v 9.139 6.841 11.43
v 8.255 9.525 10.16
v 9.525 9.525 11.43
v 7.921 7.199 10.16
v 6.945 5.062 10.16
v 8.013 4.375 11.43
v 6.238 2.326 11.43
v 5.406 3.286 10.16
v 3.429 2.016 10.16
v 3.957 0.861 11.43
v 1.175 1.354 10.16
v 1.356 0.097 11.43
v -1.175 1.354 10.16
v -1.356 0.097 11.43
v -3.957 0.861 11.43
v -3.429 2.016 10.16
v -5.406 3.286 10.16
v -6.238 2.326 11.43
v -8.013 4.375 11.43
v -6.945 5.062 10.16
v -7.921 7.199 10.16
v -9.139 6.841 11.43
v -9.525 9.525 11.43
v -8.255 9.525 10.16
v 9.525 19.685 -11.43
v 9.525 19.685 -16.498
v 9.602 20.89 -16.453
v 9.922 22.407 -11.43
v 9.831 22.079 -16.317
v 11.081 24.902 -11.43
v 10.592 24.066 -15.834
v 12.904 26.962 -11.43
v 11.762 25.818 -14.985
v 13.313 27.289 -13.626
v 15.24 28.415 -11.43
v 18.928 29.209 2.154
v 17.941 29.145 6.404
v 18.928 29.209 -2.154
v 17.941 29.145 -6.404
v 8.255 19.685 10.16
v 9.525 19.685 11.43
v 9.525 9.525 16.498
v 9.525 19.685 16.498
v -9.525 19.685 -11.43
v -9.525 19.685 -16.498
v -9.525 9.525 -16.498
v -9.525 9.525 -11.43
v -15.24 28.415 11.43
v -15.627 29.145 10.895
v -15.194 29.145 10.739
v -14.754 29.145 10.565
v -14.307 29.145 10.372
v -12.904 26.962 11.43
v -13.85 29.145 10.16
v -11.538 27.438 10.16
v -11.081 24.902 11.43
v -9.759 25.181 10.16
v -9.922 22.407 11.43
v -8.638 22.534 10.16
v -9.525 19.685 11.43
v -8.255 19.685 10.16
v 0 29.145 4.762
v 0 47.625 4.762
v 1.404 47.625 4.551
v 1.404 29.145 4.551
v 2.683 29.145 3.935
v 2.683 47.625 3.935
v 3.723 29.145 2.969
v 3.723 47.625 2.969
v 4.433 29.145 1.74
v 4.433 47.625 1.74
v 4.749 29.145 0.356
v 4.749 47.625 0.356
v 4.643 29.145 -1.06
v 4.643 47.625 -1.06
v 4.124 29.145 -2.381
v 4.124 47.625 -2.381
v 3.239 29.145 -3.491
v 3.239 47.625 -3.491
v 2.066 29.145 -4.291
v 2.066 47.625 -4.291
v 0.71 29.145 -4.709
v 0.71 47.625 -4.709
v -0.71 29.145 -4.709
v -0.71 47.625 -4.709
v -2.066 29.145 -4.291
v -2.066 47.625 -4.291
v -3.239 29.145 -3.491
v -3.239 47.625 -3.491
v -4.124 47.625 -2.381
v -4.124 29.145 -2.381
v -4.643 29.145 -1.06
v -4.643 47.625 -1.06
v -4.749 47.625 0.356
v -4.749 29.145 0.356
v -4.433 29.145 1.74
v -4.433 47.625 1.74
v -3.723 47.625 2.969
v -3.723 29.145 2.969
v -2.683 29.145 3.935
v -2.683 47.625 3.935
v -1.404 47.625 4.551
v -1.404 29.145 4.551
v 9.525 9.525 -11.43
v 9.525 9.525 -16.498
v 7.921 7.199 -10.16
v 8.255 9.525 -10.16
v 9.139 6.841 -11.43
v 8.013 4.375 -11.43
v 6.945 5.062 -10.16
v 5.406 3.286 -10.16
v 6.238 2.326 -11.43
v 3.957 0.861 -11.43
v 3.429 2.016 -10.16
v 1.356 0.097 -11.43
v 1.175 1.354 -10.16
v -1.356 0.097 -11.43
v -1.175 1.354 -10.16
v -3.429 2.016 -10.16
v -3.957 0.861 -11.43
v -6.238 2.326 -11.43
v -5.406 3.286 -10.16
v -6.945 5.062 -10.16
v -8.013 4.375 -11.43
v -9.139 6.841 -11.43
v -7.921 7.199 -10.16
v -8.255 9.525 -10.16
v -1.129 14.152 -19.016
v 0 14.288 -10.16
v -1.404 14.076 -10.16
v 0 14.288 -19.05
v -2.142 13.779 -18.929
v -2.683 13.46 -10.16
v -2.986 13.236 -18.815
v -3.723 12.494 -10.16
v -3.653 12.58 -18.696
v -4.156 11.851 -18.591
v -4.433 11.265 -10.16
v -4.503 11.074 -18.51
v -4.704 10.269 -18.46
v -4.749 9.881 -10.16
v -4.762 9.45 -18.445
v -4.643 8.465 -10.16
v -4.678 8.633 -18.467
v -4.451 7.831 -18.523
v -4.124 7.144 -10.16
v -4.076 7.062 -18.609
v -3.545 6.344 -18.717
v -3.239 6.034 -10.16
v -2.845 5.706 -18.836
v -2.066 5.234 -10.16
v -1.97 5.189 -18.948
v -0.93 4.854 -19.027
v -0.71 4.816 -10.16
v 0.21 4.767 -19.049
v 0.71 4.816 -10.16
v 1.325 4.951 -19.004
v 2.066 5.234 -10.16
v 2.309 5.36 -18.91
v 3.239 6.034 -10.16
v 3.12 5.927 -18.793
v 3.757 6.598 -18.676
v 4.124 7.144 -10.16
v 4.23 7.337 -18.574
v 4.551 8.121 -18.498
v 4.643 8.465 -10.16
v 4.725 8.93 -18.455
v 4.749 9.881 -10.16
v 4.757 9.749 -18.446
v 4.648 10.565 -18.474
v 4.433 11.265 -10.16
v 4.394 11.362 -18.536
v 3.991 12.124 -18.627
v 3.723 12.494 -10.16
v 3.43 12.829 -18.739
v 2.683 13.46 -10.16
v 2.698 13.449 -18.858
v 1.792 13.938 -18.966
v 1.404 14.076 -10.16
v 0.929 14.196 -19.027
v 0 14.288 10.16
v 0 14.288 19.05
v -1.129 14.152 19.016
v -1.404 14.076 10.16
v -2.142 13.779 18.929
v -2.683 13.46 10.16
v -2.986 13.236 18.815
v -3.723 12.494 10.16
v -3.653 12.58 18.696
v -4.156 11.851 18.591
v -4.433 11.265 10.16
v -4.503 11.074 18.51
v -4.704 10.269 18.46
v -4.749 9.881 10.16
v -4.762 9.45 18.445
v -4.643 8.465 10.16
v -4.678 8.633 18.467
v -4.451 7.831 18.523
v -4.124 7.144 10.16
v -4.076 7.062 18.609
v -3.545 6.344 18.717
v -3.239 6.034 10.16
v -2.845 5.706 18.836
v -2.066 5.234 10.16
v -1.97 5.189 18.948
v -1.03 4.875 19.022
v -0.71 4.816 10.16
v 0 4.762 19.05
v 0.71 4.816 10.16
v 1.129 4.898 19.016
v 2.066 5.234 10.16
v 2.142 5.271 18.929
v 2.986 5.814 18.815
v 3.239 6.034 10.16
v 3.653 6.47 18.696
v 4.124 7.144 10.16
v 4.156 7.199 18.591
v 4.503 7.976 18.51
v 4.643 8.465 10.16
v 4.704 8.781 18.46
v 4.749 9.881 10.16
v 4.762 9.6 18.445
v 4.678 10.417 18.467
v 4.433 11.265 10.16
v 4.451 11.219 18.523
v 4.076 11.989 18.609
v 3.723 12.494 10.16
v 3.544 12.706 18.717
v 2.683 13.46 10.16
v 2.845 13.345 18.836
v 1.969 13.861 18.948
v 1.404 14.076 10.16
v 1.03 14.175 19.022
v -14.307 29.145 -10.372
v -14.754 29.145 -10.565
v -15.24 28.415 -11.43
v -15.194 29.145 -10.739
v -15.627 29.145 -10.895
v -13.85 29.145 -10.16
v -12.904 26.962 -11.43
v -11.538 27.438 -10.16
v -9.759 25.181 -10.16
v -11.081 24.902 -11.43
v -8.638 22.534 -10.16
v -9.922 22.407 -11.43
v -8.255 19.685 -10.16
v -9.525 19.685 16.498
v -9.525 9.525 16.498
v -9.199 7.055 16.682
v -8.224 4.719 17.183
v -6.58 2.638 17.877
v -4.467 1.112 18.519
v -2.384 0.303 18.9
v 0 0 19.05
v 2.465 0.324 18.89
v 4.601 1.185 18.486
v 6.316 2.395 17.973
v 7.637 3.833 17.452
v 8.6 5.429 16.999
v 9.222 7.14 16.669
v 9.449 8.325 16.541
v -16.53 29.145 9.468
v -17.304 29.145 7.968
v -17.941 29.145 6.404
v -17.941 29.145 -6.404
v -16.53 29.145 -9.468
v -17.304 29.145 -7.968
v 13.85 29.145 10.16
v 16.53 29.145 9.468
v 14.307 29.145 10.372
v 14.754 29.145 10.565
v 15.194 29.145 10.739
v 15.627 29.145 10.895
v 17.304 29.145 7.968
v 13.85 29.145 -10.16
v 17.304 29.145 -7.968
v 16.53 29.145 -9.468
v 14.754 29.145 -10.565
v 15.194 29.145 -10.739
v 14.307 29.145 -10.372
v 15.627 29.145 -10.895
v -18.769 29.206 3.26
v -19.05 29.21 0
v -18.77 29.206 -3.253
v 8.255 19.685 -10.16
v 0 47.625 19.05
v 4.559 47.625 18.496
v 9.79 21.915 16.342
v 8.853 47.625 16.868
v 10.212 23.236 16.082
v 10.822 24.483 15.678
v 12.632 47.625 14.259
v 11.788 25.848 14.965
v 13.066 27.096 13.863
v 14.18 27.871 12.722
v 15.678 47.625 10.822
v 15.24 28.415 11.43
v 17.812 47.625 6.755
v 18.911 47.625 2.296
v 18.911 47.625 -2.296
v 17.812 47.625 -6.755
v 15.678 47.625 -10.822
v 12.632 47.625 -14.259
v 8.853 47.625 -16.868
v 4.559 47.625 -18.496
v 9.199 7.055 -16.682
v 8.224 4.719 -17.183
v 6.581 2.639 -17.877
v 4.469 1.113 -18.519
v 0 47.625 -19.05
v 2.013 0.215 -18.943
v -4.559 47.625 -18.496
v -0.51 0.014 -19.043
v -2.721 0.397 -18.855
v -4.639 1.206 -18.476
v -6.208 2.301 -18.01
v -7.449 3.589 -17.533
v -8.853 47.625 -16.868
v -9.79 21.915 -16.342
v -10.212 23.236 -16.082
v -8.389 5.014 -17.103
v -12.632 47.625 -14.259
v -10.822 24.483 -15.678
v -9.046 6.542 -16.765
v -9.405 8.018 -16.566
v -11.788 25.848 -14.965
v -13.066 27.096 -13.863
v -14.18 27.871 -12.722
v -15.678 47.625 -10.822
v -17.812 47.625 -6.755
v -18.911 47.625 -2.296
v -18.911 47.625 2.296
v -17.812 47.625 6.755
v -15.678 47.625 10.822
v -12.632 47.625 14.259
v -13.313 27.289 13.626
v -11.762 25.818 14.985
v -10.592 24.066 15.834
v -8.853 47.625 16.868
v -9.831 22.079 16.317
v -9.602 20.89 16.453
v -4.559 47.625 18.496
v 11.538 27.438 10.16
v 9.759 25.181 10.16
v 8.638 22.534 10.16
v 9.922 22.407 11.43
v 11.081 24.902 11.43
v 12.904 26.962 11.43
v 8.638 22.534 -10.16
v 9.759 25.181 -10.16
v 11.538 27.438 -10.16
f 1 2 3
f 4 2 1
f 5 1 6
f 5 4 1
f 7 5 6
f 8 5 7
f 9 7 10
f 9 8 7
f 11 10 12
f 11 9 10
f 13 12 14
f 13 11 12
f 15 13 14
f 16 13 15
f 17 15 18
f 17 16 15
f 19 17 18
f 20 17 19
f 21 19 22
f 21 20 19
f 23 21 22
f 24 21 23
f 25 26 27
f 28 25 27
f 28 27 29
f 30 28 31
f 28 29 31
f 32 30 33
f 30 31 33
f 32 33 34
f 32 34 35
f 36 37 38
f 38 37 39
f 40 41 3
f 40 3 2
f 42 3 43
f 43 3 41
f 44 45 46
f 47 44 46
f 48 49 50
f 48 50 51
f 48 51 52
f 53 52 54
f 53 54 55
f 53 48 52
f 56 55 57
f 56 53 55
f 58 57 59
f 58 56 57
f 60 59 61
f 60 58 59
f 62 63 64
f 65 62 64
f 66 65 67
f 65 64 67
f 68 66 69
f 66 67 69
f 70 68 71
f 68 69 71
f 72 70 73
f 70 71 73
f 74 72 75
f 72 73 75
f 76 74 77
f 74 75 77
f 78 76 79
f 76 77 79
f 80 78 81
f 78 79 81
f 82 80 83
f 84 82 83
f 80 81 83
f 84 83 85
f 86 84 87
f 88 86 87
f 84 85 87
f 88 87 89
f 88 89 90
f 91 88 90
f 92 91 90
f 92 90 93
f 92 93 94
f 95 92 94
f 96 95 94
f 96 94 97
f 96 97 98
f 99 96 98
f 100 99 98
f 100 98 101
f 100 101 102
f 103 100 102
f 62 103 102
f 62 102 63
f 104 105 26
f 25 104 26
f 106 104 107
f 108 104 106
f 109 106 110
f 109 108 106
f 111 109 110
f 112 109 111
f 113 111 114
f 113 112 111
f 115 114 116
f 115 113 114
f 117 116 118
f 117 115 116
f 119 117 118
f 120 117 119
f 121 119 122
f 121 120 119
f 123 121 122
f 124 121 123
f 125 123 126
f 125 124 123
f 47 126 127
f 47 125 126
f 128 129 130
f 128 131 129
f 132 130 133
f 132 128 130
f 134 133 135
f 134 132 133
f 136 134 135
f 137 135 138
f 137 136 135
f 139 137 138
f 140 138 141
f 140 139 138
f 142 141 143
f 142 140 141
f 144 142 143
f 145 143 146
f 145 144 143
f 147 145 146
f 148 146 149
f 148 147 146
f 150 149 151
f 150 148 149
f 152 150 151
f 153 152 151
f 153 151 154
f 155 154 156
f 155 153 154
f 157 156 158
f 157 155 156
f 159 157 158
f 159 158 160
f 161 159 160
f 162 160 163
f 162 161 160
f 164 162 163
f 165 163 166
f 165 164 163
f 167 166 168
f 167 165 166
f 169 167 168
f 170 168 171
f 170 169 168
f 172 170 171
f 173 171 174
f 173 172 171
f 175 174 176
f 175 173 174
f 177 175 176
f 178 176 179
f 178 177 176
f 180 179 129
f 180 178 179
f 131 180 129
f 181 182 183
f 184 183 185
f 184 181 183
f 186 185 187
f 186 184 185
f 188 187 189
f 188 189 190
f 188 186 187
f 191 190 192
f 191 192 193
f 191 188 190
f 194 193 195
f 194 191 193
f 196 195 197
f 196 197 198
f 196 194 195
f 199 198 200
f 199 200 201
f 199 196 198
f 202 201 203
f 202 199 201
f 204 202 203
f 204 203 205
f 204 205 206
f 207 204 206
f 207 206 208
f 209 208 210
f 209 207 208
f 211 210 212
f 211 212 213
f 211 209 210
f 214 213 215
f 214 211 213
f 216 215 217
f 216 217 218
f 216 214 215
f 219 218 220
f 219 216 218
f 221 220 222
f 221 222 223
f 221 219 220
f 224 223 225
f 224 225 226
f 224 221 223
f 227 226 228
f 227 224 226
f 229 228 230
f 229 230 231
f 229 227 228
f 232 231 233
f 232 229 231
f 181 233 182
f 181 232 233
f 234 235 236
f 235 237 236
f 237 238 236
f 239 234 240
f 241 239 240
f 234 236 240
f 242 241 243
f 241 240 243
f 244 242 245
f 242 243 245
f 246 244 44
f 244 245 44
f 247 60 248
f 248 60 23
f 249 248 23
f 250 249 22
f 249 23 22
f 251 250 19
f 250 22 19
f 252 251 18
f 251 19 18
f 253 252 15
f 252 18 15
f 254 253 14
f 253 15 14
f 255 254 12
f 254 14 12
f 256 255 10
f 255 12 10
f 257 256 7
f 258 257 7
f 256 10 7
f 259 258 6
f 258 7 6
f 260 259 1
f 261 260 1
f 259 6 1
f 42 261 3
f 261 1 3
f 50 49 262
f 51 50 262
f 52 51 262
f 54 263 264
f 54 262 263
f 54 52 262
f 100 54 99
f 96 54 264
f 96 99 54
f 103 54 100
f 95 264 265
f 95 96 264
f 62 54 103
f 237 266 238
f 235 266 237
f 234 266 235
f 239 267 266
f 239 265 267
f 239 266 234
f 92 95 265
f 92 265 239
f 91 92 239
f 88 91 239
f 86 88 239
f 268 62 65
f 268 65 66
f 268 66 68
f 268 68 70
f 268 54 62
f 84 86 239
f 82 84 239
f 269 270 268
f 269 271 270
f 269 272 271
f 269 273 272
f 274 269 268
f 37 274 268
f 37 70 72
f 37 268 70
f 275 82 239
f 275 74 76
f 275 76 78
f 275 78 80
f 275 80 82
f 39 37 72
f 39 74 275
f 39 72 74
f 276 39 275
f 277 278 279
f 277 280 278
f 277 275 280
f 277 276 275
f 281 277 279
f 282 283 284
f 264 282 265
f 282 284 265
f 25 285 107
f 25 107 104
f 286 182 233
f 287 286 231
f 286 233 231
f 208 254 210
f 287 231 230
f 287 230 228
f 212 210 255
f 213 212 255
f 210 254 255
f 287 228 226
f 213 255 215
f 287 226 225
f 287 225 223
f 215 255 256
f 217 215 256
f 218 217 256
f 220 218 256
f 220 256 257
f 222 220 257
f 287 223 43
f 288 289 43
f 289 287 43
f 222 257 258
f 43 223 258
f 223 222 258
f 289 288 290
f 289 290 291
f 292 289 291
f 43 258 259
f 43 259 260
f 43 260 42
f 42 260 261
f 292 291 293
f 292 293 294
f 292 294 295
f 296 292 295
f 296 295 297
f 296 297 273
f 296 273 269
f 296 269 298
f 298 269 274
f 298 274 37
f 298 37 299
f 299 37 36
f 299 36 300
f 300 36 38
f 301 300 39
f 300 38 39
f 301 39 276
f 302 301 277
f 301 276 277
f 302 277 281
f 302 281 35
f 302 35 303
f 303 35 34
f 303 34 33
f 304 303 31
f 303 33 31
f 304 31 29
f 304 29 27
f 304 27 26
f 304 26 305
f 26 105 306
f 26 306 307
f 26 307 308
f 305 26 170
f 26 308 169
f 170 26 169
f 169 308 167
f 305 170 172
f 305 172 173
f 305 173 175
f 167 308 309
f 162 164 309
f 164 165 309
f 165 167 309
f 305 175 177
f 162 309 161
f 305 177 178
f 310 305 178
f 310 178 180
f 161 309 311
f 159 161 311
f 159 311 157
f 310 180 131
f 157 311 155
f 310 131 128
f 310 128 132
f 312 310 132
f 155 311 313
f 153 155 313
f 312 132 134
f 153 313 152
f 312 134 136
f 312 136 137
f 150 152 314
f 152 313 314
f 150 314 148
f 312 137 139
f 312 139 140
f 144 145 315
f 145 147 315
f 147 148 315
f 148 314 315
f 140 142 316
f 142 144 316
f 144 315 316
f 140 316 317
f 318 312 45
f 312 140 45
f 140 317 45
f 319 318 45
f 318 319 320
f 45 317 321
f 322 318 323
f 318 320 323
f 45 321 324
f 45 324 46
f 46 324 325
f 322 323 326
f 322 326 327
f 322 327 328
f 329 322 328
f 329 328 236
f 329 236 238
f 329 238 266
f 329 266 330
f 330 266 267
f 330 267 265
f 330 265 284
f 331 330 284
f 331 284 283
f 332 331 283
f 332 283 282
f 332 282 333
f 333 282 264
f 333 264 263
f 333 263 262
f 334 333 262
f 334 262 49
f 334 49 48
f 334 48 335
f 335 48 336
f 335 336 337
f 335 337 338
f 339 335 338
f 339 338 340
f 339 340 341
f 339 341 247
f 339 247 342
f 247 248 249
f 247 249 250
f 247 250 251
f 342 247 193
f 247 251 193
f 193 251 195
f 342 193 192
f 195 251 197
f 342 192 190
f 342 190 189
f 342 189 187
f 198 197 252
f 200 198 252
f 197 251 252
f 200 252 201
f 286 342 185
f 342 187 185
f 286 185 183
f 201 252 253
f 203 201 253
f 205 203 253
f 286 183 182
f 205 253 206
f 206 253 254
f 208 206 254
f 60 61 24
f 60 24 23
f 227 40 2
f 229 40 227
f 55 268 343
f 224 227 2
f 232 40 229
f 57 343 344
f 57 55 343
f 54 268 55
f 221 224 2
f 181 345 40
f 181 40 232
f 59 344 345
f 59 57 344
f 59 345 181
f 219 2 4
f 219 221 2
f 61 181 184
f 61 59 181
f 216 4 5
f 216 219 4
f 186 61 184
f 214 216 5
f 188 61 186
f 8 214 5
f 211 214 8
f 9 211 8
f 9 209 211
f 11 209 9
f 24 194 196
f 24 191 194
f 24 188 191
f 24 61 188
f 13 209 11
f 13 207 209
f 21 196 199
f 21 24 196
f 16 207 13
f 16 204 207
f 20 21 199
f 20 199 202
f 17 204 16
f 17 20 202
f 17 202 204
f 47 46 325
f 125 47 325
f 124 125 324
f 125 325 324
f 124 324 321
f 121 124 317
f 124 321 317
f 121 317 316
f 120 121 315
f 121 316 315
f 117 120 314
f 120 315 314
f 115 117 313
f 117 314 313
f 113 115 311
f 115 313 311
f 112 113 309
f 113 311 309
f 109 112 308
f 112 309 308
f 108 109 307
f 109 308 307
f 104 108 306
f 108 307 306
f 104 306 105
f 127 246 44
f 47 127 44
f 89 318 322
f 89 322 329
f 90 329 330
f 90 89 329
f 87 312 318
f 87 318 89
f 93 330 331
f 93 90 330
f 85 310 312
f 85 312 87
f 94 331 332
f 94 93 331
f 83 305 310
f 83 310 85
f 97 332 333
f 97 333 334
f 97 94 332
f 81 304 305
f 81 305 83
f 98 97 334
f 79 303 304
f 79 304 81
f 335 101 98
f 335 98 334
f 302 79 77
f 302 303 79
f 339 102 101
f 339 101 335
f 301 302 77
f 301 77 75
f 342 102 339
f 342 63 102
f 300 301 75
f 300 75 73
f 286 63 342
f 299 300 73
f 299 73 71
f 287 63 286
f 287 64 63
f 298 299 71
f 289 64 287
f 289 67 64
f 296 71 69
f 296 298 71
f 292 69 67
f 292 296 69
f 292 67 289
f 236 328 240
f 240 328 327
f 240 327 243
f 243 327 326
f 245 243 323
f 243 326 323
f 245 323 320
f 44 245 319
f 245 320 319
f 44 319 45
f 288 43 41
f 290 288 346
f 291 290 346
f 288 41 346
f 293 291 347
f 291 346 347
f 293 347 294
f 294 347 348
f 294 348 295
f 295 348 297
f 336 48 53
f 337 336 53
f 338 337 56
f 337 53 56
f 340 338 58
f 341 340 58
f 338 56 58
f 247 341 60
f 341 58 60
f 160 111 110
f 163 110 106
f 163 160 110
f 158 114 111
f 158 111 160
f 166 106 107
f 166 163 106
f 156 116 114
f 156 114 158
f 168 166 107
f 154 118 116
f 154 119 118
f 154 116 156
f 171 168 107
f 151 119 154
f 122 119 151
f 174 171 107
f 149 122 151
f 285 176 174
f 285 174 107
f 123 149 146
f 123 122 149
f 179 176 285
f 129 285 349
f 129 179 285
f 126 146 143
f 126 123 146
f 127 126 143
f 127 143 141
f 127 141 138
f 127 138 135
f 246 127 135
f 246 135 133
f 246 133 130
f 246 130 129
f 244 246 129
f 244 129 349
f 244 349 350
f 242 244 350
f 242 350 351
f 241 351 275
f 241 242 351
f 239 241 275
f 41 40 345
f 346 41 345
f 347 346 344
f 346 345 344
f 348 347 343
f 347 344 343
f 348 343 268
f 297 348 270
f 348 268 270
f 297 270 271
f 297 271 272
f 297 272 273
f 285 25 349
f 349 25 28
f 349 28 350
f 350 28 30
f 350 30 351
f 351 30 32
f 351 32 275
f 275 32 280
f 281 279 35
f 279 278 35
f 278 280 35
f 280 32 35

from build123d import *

# Parameters (mm, degrees)
SKETCH1_R               = 19.05
BASE_EXTRUDE_DEPTH      = 47.625
CUT_EXTRUDE1_DEPTH      = 55.716959208
CUT_EXTRUDE1_DEPTH_BACK = 55.716959208
CUT_EXTRUDE5_DEPTH      = 55.716959365
CUT_EXTRUDE5_DEPTH_BACK = 55.716959365
CUT_EXTRUDE6_DEPTH      = 55.716959365
CUT_EXTRUDE6_DEPTH_BACK = 55.716959365
SKETCH11_R              = 4.7625
SKETCH12_R              = 4.7625
CUT_EXTRUDE7_DEPTH      = 55.716959365
CHAMFER1_SIZE           = 1.27


with BuildPart() as part:
    # Sketch1 → Base-Extrude (new body)
    with BuildSketch(Plane(origin=(0, 0, 0), x_dir=(-1, 0, 0), z_dir=(0, 1, 0))):
        with Locations(Location((0, 0, 0), (0, 0, 90))):
            Circle(SKETCH1_R)
    extrude(amount=BASE_EXTRUDE_DEPTH)

    # Sketch2 → Cut-Extrude1 (cut, two sides: drawn at the far end of the back side and taken through both)
    with BuildSketch(Plane.XY.offset(-CUT_EXTRUDE1_DEPTH_BACK)):
        with BuildLine():
            Line((-19.05, -131.979516723), (-19.05, 0))
            Line((-19.05, 0), (-19.05, 29.21))
            ThreePointArc((-19.05, 29.21), (-12.314807909, 26.420192091), (-9.525, 19.685))
            Line((-9.525, 19.685), (-9.525, 9.525))
            ThreePointArc((-9.525, 9.525), (0, 0), (9.525, 9.525))
            Line((9.525, 9.525), (9.525, 19.685))
            ThreePointArc((9.525, 19.685), (12.314807909, 26.420192091), (19.05, 29.21))
            Line((19.05, 29.21), (19.05, 0))
            Line((19.05, 0), (19.05, -131.979516723))
            Line((19.05, -131.979516723), (19.05, -395.938550169))
            Line((19.05, -395.938550169), (-19.05, -395.938550169))
            Line((-19.05, -395.938550169), (-19.05, -131.979516723))
        make_face()
    extrude(amount=CUT_EXTRUDE1_DEPTH + CUT_EXTRUDE1_DEPTH_BACK, mode=Mode.SUBTRACT)

    # Sketch8 → Cut-Extrude5 (cut, two sides: drawn at the far end of the back side and taken through both)
    with BuildSketch(Plane(origin=(0, 0, 0), x_dir=(0, 0, -1), z_dir=(1, 0, 0)).offset(-CUT_EXTRUDE5_DEPTH_BACK)):
        Polygon((-10.16, -121.738350451), (-10.16, 0), (-10.16, 29.145238826), (10.16, 29.145238826), (10.16, 0), (10.16, -121.738350451), (10.16, -365.215051352), (-10.16, -365.215051352), align=None)
    extrude(amount=CUT_EXTRUDE5_DEPTH + CUT_EXTRUDE5_DEPTH_BACK, mode=Mode.SUBTRACT)

    # Sketch11 → Cut-Extrude6 (cut, two sides: drawn at the far end of the back side and taken through both)
    with BuildSketch(Plane.XY.offset(-CUT_EXTRUDE6_DEPTH_BACK)):
        with Locations(Location((0, 9.525, 0), (0, 0, 90))):
            Circle(SKETCH11_R)
    extrude(amount=CUT_EXTRUDE6_DEPTH + CUT_EXTRUDE6_DEPTH_BACK, mode=Mode.SUBTRACT)

    # Sketch12 → Cut-Extrude7 (cut, through all)
    with BuildSketch(Plane(origin=(0, 47.625, 0), x_dir=(-1, 0, 0), z_dir=(0, 1, 0))):
        with Locations(Location((0, 0, 0), (0, 0, 90))):
            Circle(SKETCH12_R)
    extrude(amount=-CUT_EXTRUDE7_DEPTH, mode=Mode.SUBTRACT)

    # Chamfer1
    # the kernel refuses this chamfer: 1.27 mm, written as the material it takes off along each edge
    with BuildSketch(Plane(origin=(19.05, 19.685, -10.16), x_dir=(-1, 0, 0), z_dir=(0, -1, 0))) as chamfer1_piece_1_section:
        Polygon((9.525 + CHAMFER1_SIZE, 0), (9.525, CHAMFER1_SIZE), (9.525, 0), align=None)
    chamfer1_piece_1 = revolve(axis=Axis((19.05, 19.685, -10.16), (0, 0, -1)), revolution_arc=91.701103325, mode=Mode.PRIVATE)
    chamfer1_piece_1 = split(chamfer1_piece_1, bisect_by=Plane(origin=(9.159628587, 29.145238826, -10.520330591), z_dir=(0, -1, 0)), keep=Keep.TOP, mode=Mode.PRIVATE)
    add(chamfer1_piece_1, mode=Mode.SUBTRACT)
    with BuildSketch(Plane(origin=(9.525, 19.685, -10.16), x_dir=(-0.9996219169112966, 0, 0.027495876610585942), z_dir=(0, -1, 0)), Plane(origin=(-9.525, 9.525, -10.16), x_dir=(0.9996219169112966, 0, 0.027495876610585942), z_dir=(0, 1, 0)), Plane(origin=(-9.525, 19.685, 10.16), x_dir=(0.9996219169112966, 0, -0.027495876610585942), z_dir=(0, -1, 0))) as chamfer1_piece_2:
        Polygon((CHAMFER1_SIZE * 0.999621916911, CHAMFER1_SIZE * 0.0274958766106), (-CHAMFER1_SIZE * 0.0274958766106, CHAMFER1_SIZE * 0.999621916911), (0, 0), align=None)
    extrude(amount=10.16, mode=Mode.SUBTRACT)
    with BuildSketch(Plane(origin=(0, 9.525, -10.16), x_dir=(1, 0, 0), z_dir=(0, 1, 0))) as chamfer1_piece_3:
        Polygon((9.525 - CHAMFER1_SIZE, 0), (9.525, CHAMFER1_SIZE), (9.525, 0), align=None)
    revolve(axis=Axis((0, 9.525, -10.16), (0, 0, -1)), revolution_arc=180, mode=Mode.SUBTRACT)
    with BuildSketch(Plane(origin=(-19.05, 19.685, -10.16), x_dir=(-0.029685492056236547, 0.9995592886674503, 0), z_dir=(-0.9995592886674503, -0.029685492056236547, 0))) as chamfer1_piece_4_section:
        Polygon((9.525 + CHAMFER1_SIZE, 0), (9.525, CHAMFER1_SIZE), (9.525, 0), align=None)
    chamfer1_piece_4 = revolve(axis=Axis((-19.05, 19.685, -10.16), (0, 0, -1)), revolution_arc=91.701103313, mode=Mode.PRIVATE)
    chamfer1_piece_4 = split(chamfer1_piece_4, bisect_by=Plane(origin=(-11.981482464, 29.145238826, -10.596388044), z_dir=(0, -1, 0)), keep=Keep.TOP, mode=Mode.PRIVATE)
    add(chamfer1_piece_4, mode=Mode.SUBTRACT)
    with BuildSketch(Plane(origin=(19.05, 19.685, 10.16), x_dir=(-1, 0, 0), z_dir=(0, -1, 0))) as chamfer1_piece_5_section:
        Polygon((9.525, -CHAMFER1_SIZE), (9.525 + CHAMFER1_SIZE, 0), (9.525, 0), align=None)
    chamfer1_piece_5 = revolve(axis=Axis((19.05, 19.685, 10.16), (0, 0, -1)), revolution_arc=91.701103313, mode=Mode.PRIVATE)
    chamfer1_piece_5 = split(chamfer1_piece_5, bisect_by=Plane(origin=(11.981482474, 29.145238826, 10.59638804), z_dir=(0, -1, 0)), keep=Keep.TOP, mode=Mode.PRIVATE)
    add(chamfer1_piece_5, mode=Mode.SUBTRACT)
    with BuildSketch(Plane(origin=(9.525, 9.525, 10.16), x_dir=(0.02749587661058595, 0, 0.9996219169112968), z_dir=(0, 1, 0))) as chamfer1_piece_6:
        Polygon((CHAMFER1_SIZE * 0.999621916911, -CHAMFER1_SIZE * 0.0274958766106), (-CHAMFER1_SIZE * 0.0274958766106, -CHAMFER1_SIZE * 0.999621916911), (0, 0), align=None)
    extrude(amount=10.16, mode=Mode.SUBTRACT)
    with BuildSketch(Plane(origin=(0, 9.525, 10.16), x_dir=(1, 0, 0), z_dir=(0, 1, 0))) as chamfer1_piece_7:
        Polygon((9.525, -CHAMFER1_SIZE), (9.525 - CHAMFER1_SIZE, 0), (9.525, 0), align=None)
    revolve(axis=Axis((0, 9.525, 10.16), (0, 0, -1)), revolution_arc=180, mode=Mode.SUBTRACT)
    with BuildSketch(Plane(origin=(-19.05, 19.685, 10.16), x_dir=(-0.02968549226478587, 0.9995592886612565, 0), z_dir=(-0.9995592886612565, -0.02968549226478587, 0))) as chamfer1_piece_8_section:
        Polygon((9.525 + CHAMFER1_SIZE, 0), (9.525, -CHAMFER1_SIZE), (9.525, 0), align=None)
    chamfer1_piece_8 = revolve(axis=Axis((-19.05, 19.685, 10.16), (0, 0, -1)), revolution_arc=91.701103325, mode=Mode.PRIVATE)
    chamfer1_piece_8 = split(chamfer1_piece_8, bisect_by=Plane(origin=(-11.981482467, 29.145238826, 10.596388044), z_dir=(0, -1, 0)), keep=Keep.TOP, mode=Mode.PRIVATE)
    add(chamfer1_piece_8, mode=Mode.SUBTRACT)


solid = part.part
